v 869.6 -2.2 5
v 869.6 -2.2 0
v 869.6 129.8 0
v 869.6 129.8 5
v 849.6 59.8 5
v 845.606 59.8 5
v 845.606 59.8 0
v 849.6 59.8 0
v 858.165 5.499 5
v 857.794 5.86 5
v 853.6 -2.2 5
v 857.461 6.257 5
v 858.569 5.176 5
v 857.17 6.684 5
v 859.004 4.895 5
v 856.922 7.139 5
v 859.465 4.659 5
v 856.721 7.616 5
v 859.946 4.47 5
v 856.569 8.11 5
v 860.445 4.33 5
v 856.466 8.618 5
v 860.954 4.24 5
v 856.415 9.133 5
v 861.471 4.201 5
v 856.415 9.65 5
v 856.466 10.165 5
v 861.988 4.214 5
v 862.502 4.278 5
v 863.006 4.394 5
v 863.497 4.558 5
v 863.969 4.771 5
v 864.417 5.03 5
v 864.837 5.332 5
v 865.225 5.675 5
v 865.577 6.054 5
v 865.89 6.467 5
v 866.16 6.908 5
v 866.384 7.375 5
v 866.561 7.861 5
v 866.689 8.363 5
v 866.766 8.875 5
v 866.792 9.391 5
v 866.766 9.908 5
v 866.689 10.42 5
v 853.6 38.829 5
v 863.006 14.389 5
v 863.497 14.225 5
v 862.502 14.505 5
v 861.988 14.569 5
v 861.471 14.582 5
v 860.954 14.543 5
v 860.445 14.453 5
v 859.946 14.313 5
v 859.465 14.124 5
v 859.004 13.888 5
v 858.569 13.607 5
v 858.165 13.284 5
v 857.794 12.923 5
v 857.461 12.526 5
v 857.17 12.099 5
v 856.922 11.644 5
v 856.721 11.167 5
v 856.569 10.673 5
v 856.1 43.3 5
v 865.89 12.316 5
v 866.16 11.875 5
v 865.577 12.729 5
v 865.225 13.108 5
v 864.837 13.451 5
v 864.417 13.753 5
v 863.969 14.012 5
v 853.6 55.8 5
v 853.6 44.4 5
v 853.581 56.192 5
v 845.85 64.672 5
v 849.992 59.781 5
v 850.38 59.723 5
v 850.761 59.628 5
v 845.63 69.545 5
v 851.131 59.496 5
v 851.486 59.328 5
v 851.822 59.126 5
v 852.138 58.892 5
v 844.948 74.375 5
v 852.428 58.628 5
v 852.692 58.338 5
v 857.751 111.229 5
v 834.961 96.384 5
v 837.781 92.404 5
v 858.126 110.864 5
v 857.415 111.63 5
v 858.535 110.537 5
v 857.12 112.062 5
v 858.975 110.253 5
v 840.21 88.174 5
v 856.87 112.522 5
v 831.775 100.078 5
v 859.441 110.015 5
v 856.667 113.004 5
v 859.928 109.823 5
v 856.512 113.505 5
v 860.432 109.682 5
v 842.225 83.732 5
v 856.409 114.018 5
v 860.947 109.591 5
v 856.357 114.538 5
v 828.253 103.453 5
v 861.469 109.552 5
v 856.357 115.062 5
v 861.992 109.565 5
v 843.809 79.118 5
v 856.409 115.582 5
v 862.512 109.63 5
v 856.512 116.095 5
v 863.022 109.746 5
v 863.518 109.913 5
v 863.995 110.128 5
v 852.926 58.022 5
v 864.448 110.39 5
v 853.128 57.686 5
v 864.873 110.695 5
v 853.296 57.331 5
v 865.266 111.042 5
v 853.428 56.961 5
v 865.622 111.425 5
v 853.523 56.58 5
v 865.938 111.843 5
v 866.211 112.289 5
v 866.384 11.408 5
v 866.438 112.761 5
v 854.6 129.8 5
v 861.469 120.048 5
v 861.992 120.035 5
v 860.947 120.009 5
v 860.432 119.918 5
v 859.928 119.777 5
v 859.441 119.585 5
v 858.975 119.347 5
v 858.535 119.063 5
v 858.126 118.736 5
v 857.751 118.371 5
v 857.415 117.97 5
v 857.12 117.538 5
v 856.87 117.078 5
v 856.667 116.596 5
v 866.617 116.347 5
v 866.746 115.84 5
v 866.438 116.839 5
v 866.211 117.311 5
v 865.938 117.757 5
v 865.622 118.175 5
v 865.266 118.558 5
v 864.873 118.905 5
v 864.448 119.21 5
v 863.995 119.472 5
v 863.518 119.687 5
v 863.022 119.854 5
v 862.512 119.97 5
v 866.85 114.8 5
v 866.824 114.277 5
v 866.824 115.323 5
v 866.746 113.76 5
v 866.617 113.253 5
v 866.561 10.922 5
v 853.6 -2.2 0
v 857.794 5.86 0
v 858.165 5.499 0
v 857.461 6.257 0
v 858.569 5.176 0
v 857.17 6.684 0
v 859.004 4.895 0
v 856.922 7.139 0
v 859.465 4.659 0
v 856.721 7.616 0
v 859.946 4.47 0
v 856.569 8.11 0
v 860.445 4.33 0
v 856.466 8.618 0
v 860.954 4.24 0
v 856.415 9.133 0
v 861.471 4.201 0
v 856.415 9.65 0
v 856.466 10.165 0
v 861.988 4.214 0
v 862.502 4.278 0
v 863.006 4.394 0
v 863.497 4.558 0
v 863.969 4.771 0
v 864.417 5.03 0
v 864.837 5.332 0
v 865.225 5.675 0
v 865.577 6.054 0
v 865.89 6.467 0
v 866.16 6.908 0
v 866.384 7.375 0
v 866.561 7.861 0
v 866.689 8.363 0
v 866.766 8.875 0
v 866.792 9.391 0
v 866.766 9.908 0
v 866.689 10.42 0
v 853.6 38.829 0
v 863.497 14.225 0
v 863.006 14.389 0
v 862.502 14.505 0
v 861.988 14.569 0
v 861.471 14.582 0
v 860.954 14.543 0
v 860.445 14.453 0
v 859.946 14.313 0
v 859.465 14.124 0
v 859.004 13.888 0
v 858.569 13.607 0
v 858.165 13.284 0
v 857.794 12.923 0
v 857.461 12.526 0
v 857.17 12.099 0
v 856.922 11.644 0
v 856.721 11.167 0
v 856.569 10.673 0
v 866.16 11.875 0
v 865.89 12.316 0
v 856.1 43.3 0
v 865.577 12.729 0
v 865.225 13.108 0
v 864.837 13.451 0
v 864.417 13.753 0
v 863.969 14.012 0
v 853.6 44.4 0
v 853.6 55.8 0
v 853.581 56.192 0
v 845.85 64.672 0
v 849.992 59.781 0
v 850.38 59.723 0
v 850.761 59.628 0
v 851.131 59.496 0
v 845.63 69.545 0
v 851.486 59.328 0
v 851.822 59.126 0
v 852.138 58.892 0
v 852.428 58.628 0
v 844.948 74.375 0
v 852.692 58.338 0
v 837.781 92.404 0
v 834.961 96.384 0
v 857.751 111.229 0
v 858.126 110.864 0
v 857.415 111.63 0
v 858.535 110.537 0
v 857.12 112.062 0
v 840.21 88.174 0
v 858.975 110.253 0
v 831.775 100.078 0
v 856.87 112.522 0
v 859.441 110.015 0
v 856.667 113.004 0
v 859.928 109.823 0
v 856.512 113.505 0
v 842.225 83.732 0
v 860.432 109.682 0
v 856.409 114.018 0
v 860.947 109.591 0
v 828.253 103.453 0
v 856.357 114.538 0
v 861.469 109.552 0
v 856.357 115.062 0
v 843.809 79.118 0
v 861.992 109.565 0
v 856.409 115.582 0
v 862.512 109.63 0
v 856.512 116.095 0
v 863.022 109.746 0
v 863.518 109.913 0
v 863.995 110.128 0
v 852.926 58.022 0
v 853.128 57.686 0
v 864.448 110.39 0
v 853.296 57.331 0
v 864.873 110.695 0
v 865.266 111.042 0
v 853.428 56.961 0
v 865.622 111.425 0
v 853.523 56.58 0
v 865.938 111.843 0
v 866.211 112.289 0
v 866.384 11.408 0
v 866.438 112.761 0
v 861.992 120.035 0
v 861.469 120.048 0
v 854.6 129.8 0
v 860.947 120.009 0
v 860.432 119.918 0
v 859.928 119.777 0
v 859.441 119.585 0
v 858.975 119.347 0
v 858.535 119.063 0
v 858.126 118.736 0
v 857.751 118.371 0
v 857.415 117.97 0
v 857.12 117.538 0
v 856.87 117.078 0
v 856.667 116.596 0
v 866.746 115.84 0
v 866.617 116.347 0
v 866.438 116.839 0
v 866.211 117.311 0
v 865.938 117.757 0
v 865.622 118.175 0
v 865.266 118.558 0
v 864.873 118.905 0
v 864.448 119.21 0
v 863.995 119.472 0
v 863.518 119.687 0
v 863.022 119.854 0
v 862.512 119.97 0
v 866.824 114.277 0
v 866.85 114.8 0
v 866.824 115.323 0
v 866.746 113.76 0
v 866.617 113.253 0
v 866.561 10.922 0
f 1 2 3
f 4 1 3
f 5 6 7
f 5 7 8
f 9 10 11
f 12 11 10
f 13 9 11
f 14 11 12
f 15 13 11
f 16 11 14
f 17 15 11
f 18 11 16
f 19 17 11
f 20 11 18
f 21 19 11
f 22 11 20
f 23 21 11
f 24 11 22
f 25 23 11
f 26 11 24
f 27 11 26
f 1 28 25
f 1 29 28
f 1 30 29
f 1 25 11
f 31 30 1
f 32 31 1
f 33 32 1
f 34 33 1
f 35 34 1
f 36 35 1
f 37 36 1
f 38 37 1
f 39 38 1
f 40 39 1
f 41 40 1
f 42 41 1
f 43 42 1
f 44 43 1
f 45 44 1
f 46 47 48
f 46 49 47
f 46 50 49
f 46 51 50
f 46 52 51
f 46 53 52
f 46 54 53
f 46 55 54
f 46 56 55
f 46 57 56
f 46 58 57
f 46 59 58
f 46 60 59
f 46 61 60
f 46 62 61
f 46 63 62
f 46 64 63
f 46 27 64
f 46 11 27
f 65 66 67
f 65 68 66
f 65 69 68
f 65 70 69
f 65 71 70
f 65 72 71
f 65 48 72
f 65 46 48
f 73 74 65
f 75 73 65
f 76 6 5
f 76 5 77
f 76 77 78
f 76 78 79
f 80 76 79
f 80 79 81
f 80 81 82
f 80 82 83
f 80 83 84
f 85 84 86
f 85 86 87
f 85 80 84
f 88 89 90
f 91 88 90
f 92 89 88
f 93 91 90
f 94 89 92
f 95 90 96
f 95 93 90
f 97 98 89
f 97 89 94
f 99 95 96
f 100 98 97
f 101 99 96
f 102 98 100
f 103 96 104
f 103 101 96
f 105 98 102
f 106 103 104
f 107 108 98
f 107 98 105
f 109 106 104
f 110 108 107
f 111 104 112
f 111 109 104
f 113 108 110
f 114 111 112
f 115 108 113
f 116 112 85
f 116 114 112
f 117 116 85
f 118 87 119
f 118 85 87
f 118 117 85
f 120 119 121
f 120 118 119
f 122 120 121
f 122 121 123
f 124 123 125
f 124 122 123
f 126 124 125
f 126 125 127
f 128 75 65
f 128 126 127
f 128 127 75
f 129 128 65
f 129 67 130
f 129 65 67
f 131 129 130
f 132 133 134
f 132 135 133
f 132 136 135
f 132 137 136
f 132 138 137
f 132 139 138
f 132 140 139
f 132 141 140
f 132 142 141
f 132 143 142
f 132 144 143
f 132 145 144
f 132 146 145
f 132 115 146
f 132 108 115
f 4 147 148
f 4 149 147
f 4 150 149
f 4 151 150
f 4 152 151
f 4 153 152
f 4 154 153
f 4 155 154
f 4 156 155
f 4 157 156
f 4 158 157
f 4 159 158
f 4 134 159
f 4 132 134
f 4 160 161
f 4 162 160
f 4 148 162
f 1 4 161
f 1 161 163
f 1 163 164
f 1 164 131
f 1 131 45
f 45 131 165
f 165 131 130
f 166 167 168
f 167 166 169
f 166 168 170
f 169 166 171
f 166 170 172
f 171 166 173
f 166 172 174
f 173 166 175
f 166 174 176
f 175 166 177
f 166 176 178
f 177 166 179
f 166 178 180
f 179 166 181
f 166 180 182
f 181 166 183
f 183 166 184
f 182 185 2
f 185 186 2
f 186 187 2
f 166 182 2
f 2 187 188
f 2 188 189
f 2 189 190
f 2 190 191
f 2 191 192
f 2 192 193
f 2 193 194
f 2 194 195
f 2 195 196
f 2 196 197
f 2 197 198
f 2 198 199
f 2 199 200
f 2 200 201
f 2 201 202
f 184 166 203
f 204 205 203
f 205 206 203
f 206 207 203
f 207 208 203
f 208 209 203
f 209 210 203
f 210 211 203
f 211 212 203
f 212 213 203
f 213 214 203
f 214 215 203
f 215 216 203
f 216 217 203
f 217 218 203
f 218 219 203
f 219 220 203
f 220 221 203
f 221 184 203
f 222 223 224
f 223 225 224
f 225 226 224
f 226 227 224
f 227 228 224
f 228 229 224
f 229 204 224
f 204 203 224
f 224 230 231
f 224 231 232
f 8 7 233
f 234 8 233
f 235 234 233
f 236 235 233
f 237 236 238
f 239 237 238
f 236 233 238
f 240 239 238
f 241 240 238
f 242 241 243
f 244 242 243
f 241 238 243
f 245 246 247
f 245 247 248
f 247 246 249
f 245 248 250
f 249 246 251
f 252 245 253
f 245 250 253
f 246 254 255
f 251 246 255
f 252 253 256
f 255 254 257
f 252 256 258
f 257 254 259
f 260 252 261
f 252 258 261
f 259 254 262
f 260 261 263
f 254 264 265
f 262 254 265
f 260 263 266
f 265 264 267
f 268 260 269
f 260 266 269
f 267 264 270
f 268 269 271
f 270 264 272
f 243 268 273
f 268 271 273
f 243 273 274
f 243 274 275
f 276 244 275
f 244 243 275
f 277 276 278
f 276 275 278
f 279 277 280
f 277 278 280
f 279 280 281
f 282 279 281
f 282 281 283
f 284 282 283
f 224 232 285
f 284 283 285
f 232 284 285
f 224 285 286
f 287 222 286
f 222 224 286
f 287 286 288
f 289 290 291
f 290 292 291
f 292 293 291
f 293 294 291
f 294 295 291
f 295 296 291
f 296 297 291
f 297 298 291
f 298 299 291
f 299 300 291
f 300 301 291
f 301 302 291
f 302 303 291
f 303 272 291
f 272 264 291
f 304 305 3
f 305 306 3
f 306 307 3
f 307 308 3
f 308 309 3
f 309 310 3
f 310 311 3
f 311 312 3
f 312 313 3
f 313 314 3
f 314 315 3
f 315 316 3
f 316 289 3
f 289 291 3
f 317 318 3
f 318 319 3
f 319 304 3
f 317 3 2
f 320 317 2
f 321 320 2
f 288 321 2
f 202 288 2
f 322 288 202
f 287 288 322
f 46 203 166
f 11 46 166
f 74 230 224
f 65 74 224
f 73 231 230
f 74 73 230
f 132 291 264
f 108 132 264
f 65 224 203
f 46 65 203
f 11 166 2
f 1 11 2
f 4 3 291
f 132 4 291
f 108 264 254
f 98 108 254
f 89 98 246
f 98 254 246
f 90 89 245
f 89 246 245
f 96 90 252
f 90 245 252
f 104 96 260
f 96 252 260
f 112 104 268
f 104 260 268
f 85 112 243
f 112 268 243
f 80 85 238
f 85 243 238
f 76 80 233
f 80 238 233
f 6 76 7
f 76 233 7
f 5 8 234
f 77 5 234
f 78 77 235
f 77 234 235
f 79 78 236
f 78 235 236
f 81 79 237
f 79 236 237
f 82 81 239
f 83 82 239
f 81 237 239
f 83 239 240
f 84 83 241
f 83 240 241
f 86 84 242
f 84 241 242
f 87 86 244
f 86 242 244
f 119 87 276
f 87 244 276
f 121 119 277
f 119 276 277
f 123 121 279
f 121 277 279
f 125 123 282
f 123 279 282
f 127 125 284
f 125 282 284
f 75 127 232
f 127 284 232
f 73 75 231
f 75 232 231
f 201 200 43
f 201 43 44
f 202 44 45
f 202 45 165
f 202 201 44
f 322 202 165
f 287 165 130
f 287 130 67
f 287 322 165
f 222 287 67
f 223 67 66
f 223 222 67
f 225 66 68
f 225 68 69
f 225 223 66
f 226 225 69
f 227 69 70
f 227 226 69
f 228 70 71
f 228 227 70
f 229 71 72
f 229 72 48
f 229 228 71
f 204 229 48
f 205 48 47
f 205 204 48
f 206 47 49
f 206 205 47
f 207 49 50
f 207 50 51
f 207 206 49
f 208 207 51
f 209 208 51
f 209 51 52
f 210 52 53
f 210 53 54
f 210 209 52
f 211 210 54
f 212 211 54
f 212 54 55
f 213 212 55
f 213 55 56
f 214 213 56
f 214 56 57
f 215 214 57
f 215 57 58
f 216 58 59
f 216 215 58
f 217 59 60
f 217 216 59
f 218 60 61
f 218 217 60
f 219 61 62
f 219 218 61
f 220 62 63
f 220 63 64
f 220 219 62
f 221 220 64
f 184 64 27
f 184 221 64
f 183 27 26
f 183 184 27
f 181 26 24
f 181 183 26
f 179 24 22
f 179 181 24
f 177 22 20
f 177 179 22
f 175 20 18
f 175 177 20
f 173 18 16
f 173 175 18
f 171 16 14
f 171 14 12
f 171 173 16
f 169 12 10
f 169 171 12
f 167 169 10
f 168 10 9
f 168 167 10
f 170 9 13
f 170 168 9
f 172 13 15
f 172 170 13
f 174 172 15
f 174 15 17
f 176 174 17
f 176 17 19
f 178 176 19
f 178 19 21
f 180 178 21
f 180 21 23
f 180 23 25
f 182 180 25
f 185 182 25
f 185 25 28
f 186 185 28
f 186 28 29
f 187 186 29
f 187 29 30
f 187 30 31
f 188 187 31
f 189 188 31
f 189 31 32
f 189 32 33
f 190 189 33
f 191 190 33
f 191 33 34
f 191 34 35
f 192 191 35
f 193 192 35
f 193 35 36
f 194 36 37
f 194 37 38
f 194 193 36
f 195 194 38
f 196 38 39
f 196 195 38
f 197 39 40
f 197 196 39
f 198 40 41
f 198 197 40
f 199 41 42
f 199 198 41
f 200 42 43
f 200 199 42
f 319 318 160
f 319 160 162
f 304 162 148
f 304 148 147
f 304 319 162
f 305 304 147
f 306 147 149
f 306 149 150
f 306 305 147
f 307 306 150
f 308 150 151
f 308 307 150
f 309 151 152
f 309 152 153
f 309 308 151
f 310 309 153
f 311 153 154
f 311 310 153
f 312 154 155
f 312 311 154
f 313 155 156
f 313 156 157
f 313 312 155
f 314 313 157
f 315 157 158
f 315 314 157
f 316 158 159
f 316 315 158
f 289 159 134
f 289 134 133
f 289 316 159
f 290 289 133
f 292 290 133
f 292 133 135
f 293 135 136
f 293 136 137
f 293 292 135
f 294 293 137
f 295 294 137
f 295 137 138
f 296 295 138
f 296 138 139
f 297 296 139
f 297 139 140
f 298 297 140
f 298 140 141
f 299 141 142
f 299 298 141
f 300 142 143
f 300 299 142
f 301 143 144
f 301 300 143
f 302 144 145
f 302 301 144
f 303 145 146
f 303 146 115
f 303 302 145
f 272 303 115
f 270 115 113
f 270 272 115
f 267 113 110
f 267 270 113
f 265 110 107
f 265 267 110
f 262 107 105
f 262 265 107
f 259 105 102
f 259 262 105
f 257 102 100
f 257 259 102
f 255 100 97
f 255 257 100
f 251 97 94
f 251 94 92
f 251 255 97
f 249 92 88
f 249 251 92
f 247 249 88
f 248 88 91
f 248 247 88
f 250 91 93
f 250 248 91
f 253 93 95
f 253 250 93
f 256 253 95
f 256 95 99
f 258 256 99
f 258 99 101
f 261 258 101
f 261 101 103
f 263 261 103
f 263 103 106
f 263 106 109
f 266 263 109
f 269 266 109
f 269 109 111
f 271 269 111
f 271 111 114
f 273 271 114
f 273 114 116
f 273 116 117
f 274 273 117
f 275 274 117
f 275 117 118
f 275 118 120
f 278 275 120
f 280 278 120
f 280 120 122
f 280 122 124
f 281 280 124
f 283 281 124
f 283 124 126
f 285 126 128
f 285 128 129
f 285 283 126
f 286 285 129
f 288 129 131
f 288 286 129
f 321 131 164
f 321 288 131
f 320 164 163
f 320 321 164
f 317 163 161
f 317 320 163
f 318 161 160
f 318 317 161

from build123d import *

# Parameters (mm, degrees)
MODEL_R             = 5.191903136
MODEL_R_2           = 5.25
BOSS_EXTRUDE1_DEPTH = 5
BOSS_EXTRUDE2_DEPTH = 5
SKETCH3_R           = 51.25
CUT_EXTRUDE1_DEPTH  = 6


with BuildPart() as part:
    # Model → Boss-Extrude1 (new body)
    with BuildSketch(Plane.XY):
        with BuildLine():
            Line((869.6, 129.800004709), (854.6, 129.800004709))
            Line((854.6, 129.800004709), (854.6, 124.800004709))
            ThreePointArc((854.6, 124.800004709), (842.940279, 95.005240735), (815.123335737, 79.19718198))
            ThreePointArc((815.123335737, 79.19718198), (819.577050566, 70.004649675), (820.028101645, 59.800004709))
            Line((820.028101645, 59.800004709), (849.60000149, 59.800004709))
            ThreePointArc((849.60000149, 59.800004709), (852.428428615, 58.628431833), (853.60000149, 55.800004709))
            Line((853.60000149, 55.800004709), (853.60000149, 44.400154403))
            Line((853.60000149, 44.400154403), (856.099999799, 43.300004388))
            Line((856.099999799, 43.300004388), (853.60000149, 38.829377357))
            Line((853.60000149, 38.829377357), (853.60000149, -2.199993903))
            Line((853.60000149, -2.199993903), (869.6, -2.199993903))
            Line((869.6, -2.199993903), (869.6, 129.800004709))
        make_face()
        with Locations((861.6, 9.391497171)):
            Circle(MODEL_R, mode=Mode.SUBTRACT)
        with Locations((861.6, 114.800004709)):
            Circle(MODEL_R_2, mode=Mode.SUBTRACT)
    extrude(amount=BOSS_EXTRUDE1_DEPTH)

    # Sketch4 → Boss-Extrude2 (add)
    with BuildSketch(Plane.XY):
        Polygon((854.6, 129.800004709), (799.700462268, 74.900466976), (857.081865671, 78.451748184), (855.676639351, 119.436170701), (858.647890459, 128.484980891), align=None)
    extrude(amount=BOSS_EXTRUDE2_DEPTH)

    # Sketch3 → Cut-Extrude1 (cut)
    with BuildSketch(Plane(origin=(0, 0, 0), x_dir=(-1, 0, 0), z_dir=(0, 0, -1))):
        with Locations((-794.6, 64.800004709)):
            Circle(SKETCH3_R)
    extrude(amount=-CUT_EXTRUDE1_DEPTH, mode=Mode.SUBTRACT)


solid = part.part
